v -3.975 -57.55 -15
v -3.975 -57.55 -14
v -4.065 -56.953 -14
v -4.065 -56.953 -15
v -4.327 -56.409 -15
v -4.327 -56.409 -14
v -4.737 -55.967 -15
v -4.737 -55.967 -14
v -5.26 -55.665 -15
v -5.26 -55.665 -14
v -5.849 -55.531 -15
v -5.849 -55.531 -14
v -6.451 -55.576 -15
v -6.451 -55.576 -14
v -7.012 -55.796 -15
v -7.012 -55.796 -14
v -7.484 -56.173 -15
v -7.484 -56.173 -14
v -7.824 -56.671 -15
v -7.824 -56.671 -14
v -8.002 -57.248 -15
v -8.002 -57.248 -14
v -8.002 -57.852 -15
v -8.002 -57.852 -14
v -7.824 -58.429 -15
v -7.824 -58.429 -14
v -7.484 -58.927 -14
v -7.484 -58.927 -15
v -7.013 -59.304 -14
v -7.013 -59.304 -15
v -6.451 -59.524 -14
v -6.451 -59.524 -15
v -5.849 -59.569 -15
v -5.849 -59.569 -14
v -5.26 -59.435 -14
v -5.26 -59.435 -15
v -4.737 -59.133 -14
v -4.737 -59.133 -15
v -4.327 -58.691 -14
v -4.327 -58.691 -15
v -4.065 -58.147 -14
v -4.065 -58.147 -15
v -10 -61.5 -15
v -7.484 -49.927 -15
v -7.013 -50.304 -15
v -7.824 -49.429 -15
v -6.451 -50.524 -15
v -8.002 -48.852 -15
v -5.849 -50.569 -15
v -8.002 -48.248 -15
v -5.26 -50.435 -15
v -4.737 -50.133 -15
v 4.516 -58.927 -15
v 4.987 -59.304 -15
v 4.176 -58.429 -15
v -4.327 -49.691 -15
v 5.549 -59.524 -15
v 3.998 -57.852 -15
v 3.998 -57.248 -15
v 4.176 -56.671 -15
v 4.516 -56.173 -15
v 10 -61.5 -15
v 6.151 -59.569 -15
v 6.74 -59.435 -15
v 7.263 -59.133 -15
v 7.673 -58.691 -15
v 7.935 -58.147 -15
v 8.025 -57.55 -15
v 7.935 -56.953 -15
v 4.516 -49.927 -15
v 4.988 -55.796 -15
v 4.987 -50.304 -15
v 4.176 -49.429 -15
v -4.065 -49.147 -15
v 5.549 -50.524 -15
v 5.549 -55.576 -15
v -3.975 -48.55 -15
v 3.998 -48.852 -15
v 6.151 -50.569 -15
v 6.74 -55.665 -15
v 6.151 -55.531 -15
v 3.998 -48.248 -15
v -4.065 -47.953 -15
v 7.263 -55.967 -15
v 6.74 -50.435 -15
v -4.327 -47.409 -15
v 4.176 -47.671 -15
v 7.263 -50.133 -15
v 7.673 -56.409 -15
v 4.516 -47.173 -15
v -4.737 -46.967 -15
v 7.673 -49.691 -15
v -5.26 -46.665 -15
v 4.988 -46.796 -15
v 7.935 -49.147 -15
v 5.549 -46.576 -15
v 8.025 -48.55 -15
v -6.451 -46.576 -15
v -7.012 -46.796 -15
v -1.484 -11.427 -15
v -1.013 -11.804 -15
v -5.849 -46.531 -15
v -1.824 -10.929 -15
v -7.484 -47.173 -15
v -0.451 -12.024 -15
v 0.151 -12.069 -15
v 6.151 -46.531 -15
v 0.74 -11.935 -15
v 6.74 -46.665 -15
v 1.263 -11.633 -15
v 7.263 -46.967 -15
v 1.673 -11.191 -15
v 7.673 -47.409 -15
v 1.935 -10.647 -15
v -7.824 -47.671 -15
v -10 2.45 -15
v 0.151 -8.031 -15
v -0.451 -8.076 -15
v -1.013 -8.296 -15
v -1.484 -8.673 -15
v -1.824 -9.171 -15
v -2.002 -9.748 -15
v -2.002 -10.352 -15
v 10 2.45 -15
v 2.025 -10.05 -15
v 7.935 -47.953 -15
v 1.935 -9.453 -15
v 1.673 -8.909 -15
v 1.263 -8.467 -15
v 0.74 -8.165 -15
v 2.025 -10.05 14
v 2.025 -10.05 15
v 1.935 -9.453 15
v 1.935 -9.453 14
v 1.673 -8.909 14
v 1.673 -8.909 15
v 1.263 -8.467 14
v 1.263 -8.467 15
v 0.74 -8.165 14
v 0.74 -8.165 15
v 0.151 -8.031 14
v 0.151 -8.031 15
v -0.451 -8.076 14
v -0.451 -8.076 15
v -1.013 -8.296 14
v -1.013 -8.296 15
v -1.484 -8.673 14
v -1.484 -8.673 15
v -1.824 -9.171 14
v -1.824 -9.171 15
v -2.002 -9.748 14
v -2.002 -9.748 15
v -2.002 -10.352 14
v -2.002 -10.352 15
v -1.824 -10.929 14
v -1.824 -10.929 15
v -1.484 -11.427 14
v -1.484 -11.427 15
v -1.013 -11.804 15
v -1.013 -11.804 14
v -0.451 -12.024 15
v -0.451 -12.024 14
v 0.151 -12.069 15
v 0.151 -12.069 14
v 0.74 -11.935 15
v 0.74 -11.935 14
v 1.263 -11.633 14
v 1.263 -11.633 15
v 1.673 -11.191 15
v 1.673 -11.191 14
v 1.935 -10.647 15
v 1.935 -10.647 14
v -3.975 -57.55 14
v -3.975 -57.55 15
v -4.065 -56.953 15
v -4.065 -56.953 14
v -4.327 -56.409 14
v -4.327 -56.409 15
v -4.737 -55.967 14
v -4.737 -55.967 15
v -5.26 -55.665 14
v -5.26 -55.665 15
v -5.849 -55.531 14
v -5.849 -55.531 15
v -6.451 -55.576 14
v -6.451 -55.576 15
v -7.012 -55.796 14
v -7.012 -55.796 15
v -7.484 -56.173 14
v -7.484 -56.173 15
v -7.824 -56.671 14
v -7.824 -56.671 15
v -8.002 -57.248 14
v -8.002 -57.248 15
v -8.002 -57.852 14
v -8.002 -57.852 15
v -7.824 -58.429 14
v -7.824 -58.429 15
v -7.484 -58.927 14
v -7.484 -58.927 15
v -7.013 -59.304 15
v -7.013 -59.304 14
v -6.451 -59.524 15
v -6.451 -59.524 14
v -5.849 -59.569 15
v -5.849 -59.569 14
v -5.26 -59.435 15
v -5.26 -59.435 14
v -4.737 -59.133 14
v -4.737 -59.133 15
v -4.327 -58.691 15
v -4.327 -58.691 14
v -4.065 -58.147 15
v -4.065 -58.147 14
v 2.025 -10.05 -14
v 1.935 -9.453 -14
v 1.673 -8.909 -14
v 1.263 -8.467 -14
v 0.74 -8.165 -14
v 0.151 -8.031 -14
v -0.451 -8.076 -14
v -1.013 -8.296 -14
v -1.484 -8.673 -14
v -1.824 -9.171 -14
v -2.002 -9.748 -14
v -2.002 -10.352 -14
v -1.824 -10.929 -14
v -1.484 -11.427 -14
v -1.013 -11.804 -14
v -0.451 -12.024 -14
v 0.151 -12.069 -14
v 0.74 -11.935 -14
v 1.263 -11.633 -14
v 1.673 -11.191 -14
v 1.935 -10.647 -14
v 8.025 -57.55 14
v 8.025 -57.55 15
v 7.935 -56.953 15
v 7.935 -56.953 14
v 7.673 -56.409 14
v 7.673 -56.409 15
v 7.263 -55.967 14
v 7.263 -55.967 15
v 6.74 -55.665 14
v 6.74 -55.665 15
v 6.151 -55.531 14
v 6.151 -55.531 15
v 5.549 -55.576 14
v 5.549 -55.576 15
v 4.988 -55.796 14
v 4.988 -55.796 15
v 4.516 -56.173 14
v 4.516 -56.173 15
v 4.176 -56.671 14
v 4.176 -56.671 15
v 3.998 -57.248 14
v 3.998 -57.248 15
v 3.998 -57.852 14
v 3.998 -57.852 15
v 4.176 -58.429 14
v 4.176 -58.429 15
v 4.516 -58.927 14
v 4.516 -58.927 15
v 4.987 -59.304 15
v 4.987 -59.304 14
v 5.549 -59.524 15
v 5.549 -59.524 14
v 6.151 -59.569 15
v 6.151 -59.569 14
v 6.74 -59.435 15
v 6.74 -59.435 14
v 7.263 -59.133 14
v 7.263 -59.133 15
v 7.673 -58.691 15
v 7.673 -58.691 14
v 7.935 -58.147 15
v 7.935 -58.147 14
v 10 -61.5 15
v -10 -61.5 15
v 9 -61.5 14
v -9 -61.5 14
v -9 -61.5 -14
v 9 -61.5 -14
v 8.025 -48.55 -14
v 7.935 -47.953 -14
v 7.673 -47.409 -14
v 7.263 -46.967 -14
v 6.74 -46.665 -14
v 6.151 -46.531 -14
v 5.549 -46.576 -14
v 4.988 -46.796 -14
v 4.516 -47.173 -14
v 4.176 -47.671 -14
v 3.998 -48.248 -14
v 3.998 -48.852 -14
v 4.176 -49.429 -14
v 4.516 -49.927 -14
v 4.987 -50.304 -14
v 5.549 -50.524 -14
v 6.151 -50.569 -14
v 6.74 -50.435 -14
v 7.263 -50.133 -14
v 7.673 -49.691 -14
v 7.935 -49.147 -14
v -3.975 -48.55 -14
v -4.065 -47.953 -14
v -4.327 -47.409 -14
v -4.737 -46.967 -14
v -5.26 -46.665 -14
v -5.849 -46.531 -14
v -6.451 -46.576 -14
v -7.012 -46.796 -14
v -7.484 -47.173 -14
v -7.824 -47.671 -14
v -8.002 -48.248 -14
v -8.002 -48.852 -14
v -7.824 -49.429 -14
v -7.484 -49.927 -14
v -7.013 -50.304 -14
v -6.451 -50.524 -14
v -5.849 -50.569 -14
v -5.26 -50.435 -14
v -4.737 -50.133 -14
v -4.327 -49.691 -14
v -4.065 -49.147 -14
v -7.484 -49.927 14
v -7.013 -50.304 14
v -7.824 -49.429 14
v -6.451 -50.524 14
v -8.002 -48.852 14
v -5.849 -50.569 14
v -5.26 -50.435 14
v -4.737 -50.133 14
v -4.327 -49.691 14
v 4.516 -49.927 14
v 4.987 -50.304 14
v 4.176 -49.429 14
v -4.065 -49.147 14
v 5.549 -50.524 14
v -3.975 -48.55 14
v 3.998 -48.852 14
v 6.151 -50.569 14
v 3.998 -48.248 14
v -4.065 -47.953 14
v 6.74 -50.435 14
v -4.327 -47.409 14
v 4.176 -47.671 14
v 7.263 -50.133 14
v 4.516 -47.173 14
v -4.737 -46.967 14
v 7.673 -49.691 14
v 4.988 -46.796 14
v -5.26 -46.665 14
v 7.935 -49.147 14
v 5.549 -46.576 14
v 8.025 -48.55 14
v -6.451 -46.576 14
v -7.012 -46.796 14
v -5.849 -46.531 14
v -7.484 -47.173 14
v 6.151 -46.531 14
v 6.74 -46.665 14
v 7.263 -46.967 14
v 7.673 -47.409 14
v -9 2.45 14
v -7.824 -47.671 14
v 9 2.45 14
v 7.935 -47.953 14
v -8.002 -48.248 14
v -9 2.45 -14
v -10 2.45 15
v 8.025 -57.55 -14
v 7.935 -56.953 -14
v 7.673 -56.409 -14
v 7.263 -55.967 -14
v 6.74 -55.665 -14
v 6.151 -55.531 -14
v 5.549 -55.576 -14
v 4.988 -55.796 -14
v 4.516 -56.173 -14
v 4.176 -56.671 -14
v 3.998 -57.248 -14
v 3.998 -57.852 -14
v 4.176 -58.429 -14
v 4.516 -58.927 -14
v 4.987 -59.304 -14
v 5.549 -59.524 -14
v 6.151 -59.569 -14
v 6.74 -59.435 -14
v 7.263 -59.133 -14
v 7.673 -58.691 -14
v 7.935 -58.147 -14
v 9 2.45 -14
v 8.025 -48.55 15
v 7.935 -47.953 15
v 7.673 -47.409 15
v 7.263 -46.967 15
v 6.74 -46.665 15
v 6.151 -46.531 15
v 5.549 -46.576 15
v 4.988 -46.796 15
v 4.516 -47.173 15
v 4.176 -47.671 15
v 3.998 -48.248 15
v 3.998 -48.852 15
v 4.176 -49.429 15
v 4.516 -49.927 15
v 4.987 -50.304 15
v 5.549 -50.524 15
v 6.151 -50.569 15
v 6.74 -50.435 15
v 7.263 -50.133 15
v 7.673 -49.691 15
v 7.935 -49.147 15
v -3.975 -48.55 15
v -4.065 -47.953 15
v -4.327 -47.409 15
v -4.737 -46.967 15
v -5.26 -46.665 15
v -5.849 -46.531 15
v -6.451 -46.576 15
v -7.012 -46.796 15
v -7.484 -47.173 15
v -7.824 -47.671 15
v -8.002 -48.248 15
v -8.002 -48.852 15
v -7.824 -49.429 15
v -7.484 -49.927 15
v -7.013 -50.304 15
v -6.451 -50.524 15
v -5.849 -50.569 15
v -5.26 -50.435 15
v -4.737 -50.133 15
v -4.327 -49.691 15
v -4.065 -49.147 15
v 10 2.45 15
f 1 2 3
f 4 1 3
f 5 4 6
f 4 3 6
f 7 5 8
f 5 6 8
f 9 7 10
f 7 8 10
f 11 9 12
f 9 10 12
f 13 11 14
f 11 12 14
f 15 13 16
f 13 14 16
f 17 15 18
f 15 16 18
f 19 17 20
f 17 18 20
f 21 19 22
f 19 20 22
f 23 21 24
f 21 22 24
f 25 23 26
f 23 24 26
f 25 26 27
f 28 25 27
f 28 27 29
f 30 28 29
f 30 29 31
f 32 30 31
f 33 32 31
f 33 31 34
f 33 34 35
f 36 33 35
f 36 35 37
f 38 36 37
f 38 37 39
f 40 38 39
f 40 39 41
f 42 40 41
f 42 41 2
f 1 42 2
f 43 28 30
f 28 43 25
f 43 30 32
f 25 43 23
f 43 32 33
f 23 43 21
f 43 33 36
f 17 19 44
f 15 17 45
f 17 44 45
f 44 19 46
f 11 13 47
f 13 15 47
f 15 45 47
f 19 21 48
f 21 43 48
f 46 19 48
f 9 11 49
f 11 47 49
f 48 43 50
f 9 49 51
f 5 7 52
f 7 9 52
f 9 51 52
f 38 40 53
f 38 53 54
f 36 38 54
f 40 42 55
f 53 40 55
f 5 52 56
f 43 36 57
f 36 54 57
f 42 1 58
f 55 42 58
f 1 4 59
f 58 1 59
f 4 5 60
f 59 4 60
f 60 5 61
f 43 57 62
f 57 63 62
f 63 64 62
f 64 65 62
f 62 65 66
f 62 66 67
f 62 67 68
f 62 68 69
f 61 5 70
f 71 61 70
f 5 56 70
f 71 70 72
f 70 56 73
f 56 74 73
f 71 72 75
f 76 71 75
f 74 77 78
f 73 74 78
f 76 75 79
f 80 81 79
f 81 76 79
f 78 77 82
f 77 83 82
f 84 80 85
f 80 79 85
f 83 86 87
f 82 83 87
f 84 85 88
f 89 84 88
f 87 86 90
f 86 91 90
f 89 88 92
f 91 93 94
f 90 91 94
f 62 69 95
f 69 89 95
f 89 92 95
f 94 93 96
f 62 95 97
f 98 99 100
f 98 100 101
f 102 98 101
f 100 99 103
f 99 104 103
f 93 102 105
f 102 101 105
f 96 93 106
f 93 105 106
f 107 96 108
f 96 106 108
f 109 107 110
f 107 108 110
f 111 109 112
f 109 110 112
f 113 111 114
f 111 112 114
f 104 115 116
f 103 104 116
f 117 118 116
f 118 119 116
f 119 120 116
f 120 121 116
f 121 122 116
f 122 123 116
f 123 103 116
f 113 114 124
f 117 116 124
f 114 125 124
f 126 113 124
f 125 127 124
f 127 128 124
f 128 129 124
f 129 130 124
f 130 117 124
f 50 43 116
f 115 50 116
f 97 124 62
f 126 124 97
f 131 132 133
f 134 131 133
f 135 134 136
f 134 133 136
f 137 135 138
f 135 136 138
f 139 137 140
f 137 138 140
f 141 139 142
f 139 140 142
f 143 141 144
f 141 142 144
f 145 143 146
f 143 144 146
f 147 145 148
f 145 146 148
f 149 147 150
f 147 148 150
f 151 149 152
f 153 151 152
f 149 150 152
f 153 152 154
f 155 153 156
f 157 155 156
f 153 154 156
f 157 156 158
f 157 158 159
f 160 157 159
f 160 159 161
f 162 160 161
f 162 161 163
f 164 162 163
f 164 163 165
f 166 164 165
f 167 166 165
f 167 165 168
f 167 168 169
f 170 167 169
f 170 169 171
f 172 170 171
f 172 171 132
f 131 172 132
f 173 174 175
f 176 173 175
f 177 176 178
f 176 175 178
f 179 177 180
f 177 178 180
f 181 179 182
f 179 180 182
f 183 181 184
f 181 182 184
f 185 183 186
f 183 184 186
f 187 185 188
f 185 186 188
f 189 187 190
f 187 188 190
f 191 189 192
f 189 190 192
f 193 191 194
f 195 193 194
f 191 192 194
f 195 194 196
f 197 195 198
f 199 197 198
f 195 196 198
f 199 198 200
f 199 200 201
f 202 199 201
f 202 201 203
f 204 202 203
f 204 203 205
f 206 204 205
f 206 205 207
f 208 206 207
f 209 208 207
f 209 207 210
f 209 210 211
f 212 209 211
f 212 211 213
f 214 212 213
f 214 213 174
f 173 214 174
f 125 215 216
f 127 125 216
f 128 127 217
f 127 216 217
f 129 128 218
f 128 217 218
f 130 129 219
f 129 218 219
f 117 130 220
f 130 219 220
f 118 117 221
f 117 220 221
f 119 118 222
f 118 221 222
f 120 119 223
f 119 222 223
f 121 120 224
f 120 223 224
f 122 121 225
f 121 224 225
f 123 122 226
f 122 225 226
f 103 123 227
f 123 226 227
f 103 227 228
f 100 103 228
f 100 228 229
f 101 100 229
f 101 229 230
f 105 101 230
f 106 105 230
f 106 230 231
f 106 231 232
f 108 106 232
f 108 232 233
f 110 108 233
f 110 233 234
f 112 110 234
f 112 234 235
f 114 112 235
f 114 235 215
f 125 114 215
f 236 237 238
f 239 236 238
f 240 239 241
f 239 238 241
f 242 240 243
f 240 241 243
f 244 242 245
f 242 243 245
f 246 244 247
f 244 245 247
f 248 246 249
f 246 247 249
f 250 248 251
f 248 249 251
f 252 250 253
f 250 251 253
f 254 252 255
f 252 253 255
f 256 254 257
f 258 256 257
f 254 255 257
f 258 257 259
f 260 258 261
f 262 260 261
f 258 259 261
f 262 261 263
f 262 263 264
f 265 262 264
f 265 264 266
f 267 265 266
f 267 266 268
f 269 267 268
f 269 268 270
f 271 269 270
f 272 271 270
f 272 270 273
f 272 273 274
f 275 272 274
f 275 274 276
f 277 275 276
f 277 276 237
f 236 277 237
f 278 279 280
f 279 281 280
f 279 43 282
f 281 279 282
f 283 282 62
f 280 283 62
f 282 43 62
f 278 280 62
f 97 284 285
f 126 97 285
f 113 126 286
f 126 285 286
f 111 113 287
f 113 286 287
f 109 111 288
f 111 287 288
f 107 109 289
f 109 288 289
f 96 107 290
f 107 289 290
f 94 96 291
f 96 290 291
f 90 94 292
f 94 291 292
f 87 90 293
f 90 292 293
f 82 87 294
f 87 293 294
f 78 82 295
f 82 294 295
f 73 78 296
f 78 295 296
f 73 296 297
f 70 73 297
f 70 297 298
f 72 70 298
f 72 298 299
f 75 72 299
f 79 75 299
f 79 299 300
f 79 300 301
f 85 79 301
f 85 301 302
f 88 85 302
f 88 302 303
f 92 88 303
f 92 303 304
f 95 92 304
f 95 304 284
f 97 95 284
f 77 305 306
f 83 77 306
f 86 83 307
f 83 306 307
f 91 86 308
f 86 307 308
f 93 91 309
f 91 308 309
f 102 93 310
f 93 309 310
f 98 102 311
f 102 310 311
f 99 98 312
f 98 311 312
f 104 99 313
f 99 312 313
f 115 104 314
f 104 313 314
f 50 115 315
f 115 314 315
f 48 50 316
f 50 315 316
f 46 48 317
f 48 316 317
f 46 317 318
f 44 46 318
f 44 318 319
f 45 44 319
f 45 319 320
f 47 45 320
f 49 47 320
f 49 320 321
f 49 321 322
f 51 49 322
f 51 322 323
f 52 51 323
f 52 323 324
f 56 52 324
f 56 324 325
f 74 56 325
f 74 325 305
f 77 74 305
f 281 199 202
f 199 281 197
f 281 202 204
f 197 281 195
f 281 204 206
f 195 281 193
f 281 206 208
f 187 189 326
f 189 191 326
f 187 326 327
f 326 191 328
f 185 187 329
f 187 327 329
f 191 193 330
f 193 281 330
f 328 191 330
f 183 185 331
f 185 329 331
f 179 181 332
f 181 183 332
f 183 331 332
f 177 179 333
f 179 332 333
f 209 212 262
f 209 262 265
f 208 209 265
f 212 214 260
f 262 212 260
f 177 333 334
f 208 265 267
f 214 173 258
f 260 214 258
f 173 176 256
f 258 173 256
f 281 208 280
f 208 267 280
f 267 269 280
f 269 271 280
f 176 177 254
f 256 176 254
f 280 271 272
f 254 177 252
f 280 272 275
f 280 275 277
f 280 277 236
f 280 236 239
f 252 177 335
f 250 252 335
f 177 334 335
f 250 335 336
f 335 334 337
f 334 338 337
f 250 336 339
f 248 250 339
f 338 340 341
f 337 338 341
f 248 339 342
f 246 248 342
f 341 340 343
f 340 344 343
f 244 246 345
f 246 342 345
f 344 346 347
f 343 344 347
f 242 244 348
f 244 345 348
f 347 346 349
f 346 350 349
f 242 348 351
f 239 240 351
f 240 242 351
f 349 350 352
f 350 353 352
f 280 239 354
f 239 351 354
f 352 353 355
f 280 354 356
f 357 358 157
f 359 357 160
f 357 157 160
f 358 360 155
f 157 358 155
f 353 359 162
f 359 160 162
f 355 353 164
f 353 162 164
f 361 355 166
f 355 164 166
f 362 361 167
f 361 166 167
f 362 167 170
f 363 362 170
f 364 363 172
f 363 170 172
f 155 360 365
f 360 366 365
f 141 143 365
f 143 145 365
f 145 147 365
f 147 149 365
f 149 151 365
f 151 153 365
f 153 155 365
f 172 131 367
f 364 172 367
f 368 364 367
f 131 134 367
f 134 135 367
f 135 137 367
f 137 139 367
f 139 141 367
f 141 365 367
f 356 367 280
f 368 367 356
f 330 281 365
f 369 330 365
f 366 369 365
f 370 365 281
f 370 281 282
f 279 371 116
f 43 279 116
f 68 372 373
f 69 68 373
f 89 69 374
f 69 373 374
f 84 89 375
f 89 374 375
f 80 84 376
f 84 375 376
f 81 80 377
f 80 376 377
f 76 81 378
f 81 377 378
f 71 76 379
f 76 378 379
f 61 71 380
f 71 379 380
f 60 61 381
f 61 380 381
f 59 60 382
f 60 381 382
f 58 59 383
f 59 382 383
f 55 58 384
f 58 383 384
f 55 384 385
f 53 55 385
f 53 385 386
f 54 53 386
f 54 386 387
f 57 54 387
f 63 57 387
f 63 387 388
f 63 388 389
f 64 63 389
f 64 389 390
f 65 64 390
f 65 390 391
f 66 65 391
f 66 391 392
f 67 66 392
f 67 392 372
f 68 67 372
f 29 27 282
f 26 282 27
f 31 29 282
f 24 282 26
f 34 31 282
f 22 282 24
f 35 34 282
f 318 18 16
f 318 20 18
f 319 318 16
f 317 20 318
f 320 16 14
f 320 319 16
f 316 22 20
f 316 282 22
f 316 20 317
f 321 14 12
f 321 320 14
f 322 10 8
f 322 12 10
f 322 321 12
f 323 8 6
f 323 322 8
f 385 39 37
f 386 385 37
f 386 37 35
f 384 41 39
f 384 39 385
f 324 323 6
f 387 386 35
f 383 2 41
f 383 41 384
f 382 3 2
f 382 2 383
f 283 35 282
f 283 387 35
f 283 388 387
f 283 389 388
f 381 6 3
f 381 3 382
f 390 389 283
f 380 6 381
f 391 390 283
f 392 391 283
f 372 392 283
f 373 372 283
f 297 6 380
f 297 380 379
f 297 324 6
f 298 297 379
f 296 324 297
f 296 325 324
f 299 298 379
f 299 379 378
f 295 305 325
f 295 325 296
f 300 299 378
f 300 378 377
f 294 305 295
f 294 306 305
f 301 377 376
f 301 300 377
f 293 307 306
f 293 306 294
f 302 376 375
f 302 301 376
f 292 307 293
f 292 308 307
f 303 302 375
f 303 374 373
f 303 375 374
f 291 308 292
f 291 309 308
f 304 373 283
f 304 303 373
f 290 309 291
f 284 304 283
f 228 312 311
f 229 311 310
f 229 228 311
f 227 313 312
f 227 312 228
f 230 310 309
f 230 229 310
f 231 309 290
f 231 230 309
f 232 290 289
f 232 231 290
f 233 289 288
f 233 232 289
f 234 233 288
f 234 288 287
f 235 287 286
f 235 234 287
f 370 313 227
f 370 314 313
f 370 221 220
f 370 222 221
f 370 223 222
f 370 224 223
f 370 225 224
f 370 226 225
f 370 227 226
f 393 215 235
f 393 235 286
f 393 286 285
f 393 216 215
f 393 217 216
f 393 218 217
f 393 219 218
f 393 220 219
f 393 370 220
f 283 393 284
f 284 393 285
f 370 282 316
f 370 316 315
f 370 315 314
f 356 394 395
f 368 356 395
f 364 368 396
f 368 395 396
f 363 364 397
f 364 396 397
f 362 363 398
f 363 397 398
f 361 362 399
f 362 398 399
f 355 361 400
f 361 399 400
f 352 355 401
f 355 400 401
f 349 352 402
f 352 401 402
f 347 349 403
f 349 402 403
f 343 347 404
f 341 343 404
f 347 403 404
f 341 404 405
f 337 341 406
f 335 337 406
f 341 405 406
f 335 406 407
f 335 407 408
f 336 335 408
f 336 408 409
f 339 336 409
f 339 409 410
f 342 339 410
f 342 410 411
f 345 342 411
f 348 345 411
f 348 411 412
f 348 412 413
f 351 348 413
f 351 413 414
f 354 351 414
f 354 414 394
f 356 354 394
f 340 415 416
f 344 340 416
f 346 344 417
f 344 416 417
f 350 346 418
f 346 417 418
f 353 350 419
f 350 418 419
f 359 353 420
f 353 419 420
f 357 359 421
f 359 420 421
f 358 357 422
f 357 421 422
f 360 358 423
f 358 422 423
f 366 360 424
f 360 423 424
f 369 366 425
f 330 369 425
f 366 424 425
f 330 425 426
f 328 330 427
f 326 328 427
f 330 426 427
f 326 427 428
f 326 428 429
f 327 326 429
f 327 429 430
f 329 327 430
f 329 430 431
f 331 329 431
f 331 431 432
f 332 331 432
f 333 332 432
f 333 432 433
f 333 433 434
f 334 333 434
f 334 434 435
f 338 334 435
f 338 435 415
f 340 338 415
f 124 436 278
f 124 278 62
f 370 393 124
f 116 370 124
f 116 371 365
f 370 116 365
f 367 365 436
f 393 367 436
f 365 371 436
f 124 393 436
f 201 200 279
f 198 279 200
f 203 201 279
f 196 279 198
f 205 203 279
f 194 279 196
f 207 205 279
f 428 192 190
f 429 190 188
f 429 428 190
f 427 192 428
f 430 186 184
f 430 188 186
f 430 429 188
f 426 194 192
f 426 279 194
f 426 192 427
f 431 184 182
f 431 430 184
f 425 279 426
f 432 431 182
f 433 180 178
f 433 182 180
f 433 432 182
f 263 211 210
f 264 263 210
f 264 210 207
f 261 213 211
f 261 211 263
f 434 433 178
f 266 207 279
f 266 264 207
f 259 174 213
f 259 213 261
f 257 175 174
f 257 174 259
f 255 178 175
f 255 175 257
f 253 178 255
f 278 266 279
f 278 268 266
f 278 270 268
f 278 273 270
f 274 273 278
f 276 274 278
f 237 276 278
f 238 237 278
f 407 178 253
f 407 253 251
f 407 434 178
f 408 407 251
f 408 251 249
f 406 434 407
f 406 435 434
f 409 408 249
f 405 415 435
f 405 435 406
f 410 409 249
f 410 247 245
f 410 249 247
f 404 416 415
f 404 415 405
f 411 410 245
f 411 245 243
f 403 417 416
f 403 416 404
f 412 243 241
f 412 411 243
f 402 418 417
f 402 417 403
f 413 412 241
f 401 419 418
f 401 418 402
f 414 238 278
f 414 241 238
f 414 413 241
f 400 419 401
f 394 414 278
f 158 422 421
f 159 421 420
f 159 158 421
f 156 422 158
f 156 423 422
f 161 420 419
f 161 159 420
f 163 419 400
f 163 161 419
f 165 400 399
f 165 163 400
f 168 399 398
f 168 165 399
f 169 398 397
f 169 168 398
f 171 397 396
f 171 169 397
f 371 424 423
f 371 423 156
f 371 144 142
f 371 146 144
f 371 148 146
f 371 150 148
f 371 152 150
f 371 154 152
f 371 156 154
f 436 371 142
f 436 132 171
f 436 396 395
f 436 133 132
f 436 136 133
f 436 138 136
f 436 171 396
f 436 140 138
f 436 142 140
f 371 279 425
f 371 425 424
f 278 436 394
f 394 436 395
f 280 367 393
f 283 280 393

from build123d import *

# Parameters (mm, degrees)
SKETCH_2_W               = 20
SKETCH_2_H               = 30
EXTRUDE_1_DEPTH          = 61.5
SKETCH_3_W               = 18
SKETCH_3_H               = 28
CUT_EXTRUDE_1_DEPTH      = 62.5
CUT_EXTRUDE_1_DEPTH_BACK = 62.5
SKETCH_4_W               = 30
SKETCH_4_H               = 45.05
CUT_EXTRUDE_2_DEPTH      = 21
SKETCH_5_R               = 2.025
CUT_EXTRUDE_3_DEPTH      = 31
SKETCH_6_W               = 20
SKETCH_6_H               = 14
CUT_EXTRUDE_4_DEPTH      = 1
CUT_EXTRUDE_4_DEPTH_BACK = 31
SKETCH_7_R               = 2.025
CUT_EXTRUDE_5_DEPTH      = 1
CUT_EXTRUDE_5_DEPTH_BACK = 31
SKETCH_8_R               = 2.025
CUT_EXTRUDE_6_DEPTH      = 31


with BuildPart() as part:
    # 草图2 → 凸台-拉伸1 (new body, symmetric)
    with BuildSketch(Plane(origin=(0, 0, 0), x_dir=(1, 0, 0), z_dir=(0, 1, 0))):
        Rectangle(SKETCH_2_W, SKETCH_2_H)
    extrude(amount=EXTRUDE_1_DEPTH, both=True)

    # 草图3 → 切除-拉伸1 (cut, two sides)
    with BuildSketch(Plane(origin=(0, 0, 0), x_dir=(1, 0, 0), z_dir=(0, 1, 0))) as cut_extrude_1_sk:
        Rectangle(SKETCH_3_W, SKETCH_3_H)
    extrude(amount=CUT_EXTRUDE_1_DEPTH, mode=Mode.SUBTRACT)
    extrude(cut_extrude_1_sk.sketch, amount=-CUT_EXTRUDE_1_DEPTH_BACK, mode=Mode.SUBTRACT)

    # 草图4 → 切除-拉伸2 (cut, through all)
    with BuildSketch(Plane.ZY.offset(10)):
        with Locations((0, 38.975)):
            Rectangle(SKETCH_4_W, SKETCH_4_H)
    extrude(amount=-CUT_EXTRUDE_2_DEPTH, mode=Mode.SUBTRACT)

    # 草图5 → 切除-拉伸3 (cut, through all)
    with BuildSketch(Plane.XY.offset(15)):
        with Locations((-6, -48.55)):
            Circle(SKETCH_5_R)
        with Locations((6, -48.55)):
            Circle(SKETCH_5_R)
    extrude(amount=-CUT_EXTRUDE_3_DEPTH, mode=Mode.SUBTRACT)

    # 草图6 → 切除-拉伸4 (cut, two sides)
    with BuildSketch(Plane.XY.offset(15)) as cut_extrude_4_sk:
        with Locations((0, 9.45)):
            Rectangle(SKETCH_6_W, SKETCH_6_H)
    extrude(amount=CUT_EXTRUDE_4_DEPTH, mode=Mode.SUBTRACT)
    extrude(cut_extrude_4_sk.sketch, amount=-CUT_EXTRUDE_4_DEPTH_BACK, mode=Mode.SUBTRACT)

    # 草图7 → 切除-拉伸5 (cut, two sides)
    with BuildSketch(Plane.XY.offset(15)) as cut_extrude_5_sk:
        with Locations((-6, -57.55)):
            Circle(SKETCH_7_R)
        with Locations((6, -57.55)):
            Circle(SKETCH_7_R)
    extrude(amount=CUT_EXTRUDE_5_DEPTH, mode=Mode.SUBTRACT)
    extrude(cut_extrude_5_sk.sketch, amount=-CUT_EXTRUDE_5_DEPTH_BACK, mode=Mode.SUBTRACT)

    # 草图8 → 切除-拉伸6 (cut, through all)
    with BuildSketch(Plane.XY.offset(15)):
        with Locations((0, -10.05)):
            Circle(SKETCH_8_R)
    extrude(amount=-CUT_EXTRUDE_6_DEPTH, mode=Mode.SUBTRACT)


solid = part.part
